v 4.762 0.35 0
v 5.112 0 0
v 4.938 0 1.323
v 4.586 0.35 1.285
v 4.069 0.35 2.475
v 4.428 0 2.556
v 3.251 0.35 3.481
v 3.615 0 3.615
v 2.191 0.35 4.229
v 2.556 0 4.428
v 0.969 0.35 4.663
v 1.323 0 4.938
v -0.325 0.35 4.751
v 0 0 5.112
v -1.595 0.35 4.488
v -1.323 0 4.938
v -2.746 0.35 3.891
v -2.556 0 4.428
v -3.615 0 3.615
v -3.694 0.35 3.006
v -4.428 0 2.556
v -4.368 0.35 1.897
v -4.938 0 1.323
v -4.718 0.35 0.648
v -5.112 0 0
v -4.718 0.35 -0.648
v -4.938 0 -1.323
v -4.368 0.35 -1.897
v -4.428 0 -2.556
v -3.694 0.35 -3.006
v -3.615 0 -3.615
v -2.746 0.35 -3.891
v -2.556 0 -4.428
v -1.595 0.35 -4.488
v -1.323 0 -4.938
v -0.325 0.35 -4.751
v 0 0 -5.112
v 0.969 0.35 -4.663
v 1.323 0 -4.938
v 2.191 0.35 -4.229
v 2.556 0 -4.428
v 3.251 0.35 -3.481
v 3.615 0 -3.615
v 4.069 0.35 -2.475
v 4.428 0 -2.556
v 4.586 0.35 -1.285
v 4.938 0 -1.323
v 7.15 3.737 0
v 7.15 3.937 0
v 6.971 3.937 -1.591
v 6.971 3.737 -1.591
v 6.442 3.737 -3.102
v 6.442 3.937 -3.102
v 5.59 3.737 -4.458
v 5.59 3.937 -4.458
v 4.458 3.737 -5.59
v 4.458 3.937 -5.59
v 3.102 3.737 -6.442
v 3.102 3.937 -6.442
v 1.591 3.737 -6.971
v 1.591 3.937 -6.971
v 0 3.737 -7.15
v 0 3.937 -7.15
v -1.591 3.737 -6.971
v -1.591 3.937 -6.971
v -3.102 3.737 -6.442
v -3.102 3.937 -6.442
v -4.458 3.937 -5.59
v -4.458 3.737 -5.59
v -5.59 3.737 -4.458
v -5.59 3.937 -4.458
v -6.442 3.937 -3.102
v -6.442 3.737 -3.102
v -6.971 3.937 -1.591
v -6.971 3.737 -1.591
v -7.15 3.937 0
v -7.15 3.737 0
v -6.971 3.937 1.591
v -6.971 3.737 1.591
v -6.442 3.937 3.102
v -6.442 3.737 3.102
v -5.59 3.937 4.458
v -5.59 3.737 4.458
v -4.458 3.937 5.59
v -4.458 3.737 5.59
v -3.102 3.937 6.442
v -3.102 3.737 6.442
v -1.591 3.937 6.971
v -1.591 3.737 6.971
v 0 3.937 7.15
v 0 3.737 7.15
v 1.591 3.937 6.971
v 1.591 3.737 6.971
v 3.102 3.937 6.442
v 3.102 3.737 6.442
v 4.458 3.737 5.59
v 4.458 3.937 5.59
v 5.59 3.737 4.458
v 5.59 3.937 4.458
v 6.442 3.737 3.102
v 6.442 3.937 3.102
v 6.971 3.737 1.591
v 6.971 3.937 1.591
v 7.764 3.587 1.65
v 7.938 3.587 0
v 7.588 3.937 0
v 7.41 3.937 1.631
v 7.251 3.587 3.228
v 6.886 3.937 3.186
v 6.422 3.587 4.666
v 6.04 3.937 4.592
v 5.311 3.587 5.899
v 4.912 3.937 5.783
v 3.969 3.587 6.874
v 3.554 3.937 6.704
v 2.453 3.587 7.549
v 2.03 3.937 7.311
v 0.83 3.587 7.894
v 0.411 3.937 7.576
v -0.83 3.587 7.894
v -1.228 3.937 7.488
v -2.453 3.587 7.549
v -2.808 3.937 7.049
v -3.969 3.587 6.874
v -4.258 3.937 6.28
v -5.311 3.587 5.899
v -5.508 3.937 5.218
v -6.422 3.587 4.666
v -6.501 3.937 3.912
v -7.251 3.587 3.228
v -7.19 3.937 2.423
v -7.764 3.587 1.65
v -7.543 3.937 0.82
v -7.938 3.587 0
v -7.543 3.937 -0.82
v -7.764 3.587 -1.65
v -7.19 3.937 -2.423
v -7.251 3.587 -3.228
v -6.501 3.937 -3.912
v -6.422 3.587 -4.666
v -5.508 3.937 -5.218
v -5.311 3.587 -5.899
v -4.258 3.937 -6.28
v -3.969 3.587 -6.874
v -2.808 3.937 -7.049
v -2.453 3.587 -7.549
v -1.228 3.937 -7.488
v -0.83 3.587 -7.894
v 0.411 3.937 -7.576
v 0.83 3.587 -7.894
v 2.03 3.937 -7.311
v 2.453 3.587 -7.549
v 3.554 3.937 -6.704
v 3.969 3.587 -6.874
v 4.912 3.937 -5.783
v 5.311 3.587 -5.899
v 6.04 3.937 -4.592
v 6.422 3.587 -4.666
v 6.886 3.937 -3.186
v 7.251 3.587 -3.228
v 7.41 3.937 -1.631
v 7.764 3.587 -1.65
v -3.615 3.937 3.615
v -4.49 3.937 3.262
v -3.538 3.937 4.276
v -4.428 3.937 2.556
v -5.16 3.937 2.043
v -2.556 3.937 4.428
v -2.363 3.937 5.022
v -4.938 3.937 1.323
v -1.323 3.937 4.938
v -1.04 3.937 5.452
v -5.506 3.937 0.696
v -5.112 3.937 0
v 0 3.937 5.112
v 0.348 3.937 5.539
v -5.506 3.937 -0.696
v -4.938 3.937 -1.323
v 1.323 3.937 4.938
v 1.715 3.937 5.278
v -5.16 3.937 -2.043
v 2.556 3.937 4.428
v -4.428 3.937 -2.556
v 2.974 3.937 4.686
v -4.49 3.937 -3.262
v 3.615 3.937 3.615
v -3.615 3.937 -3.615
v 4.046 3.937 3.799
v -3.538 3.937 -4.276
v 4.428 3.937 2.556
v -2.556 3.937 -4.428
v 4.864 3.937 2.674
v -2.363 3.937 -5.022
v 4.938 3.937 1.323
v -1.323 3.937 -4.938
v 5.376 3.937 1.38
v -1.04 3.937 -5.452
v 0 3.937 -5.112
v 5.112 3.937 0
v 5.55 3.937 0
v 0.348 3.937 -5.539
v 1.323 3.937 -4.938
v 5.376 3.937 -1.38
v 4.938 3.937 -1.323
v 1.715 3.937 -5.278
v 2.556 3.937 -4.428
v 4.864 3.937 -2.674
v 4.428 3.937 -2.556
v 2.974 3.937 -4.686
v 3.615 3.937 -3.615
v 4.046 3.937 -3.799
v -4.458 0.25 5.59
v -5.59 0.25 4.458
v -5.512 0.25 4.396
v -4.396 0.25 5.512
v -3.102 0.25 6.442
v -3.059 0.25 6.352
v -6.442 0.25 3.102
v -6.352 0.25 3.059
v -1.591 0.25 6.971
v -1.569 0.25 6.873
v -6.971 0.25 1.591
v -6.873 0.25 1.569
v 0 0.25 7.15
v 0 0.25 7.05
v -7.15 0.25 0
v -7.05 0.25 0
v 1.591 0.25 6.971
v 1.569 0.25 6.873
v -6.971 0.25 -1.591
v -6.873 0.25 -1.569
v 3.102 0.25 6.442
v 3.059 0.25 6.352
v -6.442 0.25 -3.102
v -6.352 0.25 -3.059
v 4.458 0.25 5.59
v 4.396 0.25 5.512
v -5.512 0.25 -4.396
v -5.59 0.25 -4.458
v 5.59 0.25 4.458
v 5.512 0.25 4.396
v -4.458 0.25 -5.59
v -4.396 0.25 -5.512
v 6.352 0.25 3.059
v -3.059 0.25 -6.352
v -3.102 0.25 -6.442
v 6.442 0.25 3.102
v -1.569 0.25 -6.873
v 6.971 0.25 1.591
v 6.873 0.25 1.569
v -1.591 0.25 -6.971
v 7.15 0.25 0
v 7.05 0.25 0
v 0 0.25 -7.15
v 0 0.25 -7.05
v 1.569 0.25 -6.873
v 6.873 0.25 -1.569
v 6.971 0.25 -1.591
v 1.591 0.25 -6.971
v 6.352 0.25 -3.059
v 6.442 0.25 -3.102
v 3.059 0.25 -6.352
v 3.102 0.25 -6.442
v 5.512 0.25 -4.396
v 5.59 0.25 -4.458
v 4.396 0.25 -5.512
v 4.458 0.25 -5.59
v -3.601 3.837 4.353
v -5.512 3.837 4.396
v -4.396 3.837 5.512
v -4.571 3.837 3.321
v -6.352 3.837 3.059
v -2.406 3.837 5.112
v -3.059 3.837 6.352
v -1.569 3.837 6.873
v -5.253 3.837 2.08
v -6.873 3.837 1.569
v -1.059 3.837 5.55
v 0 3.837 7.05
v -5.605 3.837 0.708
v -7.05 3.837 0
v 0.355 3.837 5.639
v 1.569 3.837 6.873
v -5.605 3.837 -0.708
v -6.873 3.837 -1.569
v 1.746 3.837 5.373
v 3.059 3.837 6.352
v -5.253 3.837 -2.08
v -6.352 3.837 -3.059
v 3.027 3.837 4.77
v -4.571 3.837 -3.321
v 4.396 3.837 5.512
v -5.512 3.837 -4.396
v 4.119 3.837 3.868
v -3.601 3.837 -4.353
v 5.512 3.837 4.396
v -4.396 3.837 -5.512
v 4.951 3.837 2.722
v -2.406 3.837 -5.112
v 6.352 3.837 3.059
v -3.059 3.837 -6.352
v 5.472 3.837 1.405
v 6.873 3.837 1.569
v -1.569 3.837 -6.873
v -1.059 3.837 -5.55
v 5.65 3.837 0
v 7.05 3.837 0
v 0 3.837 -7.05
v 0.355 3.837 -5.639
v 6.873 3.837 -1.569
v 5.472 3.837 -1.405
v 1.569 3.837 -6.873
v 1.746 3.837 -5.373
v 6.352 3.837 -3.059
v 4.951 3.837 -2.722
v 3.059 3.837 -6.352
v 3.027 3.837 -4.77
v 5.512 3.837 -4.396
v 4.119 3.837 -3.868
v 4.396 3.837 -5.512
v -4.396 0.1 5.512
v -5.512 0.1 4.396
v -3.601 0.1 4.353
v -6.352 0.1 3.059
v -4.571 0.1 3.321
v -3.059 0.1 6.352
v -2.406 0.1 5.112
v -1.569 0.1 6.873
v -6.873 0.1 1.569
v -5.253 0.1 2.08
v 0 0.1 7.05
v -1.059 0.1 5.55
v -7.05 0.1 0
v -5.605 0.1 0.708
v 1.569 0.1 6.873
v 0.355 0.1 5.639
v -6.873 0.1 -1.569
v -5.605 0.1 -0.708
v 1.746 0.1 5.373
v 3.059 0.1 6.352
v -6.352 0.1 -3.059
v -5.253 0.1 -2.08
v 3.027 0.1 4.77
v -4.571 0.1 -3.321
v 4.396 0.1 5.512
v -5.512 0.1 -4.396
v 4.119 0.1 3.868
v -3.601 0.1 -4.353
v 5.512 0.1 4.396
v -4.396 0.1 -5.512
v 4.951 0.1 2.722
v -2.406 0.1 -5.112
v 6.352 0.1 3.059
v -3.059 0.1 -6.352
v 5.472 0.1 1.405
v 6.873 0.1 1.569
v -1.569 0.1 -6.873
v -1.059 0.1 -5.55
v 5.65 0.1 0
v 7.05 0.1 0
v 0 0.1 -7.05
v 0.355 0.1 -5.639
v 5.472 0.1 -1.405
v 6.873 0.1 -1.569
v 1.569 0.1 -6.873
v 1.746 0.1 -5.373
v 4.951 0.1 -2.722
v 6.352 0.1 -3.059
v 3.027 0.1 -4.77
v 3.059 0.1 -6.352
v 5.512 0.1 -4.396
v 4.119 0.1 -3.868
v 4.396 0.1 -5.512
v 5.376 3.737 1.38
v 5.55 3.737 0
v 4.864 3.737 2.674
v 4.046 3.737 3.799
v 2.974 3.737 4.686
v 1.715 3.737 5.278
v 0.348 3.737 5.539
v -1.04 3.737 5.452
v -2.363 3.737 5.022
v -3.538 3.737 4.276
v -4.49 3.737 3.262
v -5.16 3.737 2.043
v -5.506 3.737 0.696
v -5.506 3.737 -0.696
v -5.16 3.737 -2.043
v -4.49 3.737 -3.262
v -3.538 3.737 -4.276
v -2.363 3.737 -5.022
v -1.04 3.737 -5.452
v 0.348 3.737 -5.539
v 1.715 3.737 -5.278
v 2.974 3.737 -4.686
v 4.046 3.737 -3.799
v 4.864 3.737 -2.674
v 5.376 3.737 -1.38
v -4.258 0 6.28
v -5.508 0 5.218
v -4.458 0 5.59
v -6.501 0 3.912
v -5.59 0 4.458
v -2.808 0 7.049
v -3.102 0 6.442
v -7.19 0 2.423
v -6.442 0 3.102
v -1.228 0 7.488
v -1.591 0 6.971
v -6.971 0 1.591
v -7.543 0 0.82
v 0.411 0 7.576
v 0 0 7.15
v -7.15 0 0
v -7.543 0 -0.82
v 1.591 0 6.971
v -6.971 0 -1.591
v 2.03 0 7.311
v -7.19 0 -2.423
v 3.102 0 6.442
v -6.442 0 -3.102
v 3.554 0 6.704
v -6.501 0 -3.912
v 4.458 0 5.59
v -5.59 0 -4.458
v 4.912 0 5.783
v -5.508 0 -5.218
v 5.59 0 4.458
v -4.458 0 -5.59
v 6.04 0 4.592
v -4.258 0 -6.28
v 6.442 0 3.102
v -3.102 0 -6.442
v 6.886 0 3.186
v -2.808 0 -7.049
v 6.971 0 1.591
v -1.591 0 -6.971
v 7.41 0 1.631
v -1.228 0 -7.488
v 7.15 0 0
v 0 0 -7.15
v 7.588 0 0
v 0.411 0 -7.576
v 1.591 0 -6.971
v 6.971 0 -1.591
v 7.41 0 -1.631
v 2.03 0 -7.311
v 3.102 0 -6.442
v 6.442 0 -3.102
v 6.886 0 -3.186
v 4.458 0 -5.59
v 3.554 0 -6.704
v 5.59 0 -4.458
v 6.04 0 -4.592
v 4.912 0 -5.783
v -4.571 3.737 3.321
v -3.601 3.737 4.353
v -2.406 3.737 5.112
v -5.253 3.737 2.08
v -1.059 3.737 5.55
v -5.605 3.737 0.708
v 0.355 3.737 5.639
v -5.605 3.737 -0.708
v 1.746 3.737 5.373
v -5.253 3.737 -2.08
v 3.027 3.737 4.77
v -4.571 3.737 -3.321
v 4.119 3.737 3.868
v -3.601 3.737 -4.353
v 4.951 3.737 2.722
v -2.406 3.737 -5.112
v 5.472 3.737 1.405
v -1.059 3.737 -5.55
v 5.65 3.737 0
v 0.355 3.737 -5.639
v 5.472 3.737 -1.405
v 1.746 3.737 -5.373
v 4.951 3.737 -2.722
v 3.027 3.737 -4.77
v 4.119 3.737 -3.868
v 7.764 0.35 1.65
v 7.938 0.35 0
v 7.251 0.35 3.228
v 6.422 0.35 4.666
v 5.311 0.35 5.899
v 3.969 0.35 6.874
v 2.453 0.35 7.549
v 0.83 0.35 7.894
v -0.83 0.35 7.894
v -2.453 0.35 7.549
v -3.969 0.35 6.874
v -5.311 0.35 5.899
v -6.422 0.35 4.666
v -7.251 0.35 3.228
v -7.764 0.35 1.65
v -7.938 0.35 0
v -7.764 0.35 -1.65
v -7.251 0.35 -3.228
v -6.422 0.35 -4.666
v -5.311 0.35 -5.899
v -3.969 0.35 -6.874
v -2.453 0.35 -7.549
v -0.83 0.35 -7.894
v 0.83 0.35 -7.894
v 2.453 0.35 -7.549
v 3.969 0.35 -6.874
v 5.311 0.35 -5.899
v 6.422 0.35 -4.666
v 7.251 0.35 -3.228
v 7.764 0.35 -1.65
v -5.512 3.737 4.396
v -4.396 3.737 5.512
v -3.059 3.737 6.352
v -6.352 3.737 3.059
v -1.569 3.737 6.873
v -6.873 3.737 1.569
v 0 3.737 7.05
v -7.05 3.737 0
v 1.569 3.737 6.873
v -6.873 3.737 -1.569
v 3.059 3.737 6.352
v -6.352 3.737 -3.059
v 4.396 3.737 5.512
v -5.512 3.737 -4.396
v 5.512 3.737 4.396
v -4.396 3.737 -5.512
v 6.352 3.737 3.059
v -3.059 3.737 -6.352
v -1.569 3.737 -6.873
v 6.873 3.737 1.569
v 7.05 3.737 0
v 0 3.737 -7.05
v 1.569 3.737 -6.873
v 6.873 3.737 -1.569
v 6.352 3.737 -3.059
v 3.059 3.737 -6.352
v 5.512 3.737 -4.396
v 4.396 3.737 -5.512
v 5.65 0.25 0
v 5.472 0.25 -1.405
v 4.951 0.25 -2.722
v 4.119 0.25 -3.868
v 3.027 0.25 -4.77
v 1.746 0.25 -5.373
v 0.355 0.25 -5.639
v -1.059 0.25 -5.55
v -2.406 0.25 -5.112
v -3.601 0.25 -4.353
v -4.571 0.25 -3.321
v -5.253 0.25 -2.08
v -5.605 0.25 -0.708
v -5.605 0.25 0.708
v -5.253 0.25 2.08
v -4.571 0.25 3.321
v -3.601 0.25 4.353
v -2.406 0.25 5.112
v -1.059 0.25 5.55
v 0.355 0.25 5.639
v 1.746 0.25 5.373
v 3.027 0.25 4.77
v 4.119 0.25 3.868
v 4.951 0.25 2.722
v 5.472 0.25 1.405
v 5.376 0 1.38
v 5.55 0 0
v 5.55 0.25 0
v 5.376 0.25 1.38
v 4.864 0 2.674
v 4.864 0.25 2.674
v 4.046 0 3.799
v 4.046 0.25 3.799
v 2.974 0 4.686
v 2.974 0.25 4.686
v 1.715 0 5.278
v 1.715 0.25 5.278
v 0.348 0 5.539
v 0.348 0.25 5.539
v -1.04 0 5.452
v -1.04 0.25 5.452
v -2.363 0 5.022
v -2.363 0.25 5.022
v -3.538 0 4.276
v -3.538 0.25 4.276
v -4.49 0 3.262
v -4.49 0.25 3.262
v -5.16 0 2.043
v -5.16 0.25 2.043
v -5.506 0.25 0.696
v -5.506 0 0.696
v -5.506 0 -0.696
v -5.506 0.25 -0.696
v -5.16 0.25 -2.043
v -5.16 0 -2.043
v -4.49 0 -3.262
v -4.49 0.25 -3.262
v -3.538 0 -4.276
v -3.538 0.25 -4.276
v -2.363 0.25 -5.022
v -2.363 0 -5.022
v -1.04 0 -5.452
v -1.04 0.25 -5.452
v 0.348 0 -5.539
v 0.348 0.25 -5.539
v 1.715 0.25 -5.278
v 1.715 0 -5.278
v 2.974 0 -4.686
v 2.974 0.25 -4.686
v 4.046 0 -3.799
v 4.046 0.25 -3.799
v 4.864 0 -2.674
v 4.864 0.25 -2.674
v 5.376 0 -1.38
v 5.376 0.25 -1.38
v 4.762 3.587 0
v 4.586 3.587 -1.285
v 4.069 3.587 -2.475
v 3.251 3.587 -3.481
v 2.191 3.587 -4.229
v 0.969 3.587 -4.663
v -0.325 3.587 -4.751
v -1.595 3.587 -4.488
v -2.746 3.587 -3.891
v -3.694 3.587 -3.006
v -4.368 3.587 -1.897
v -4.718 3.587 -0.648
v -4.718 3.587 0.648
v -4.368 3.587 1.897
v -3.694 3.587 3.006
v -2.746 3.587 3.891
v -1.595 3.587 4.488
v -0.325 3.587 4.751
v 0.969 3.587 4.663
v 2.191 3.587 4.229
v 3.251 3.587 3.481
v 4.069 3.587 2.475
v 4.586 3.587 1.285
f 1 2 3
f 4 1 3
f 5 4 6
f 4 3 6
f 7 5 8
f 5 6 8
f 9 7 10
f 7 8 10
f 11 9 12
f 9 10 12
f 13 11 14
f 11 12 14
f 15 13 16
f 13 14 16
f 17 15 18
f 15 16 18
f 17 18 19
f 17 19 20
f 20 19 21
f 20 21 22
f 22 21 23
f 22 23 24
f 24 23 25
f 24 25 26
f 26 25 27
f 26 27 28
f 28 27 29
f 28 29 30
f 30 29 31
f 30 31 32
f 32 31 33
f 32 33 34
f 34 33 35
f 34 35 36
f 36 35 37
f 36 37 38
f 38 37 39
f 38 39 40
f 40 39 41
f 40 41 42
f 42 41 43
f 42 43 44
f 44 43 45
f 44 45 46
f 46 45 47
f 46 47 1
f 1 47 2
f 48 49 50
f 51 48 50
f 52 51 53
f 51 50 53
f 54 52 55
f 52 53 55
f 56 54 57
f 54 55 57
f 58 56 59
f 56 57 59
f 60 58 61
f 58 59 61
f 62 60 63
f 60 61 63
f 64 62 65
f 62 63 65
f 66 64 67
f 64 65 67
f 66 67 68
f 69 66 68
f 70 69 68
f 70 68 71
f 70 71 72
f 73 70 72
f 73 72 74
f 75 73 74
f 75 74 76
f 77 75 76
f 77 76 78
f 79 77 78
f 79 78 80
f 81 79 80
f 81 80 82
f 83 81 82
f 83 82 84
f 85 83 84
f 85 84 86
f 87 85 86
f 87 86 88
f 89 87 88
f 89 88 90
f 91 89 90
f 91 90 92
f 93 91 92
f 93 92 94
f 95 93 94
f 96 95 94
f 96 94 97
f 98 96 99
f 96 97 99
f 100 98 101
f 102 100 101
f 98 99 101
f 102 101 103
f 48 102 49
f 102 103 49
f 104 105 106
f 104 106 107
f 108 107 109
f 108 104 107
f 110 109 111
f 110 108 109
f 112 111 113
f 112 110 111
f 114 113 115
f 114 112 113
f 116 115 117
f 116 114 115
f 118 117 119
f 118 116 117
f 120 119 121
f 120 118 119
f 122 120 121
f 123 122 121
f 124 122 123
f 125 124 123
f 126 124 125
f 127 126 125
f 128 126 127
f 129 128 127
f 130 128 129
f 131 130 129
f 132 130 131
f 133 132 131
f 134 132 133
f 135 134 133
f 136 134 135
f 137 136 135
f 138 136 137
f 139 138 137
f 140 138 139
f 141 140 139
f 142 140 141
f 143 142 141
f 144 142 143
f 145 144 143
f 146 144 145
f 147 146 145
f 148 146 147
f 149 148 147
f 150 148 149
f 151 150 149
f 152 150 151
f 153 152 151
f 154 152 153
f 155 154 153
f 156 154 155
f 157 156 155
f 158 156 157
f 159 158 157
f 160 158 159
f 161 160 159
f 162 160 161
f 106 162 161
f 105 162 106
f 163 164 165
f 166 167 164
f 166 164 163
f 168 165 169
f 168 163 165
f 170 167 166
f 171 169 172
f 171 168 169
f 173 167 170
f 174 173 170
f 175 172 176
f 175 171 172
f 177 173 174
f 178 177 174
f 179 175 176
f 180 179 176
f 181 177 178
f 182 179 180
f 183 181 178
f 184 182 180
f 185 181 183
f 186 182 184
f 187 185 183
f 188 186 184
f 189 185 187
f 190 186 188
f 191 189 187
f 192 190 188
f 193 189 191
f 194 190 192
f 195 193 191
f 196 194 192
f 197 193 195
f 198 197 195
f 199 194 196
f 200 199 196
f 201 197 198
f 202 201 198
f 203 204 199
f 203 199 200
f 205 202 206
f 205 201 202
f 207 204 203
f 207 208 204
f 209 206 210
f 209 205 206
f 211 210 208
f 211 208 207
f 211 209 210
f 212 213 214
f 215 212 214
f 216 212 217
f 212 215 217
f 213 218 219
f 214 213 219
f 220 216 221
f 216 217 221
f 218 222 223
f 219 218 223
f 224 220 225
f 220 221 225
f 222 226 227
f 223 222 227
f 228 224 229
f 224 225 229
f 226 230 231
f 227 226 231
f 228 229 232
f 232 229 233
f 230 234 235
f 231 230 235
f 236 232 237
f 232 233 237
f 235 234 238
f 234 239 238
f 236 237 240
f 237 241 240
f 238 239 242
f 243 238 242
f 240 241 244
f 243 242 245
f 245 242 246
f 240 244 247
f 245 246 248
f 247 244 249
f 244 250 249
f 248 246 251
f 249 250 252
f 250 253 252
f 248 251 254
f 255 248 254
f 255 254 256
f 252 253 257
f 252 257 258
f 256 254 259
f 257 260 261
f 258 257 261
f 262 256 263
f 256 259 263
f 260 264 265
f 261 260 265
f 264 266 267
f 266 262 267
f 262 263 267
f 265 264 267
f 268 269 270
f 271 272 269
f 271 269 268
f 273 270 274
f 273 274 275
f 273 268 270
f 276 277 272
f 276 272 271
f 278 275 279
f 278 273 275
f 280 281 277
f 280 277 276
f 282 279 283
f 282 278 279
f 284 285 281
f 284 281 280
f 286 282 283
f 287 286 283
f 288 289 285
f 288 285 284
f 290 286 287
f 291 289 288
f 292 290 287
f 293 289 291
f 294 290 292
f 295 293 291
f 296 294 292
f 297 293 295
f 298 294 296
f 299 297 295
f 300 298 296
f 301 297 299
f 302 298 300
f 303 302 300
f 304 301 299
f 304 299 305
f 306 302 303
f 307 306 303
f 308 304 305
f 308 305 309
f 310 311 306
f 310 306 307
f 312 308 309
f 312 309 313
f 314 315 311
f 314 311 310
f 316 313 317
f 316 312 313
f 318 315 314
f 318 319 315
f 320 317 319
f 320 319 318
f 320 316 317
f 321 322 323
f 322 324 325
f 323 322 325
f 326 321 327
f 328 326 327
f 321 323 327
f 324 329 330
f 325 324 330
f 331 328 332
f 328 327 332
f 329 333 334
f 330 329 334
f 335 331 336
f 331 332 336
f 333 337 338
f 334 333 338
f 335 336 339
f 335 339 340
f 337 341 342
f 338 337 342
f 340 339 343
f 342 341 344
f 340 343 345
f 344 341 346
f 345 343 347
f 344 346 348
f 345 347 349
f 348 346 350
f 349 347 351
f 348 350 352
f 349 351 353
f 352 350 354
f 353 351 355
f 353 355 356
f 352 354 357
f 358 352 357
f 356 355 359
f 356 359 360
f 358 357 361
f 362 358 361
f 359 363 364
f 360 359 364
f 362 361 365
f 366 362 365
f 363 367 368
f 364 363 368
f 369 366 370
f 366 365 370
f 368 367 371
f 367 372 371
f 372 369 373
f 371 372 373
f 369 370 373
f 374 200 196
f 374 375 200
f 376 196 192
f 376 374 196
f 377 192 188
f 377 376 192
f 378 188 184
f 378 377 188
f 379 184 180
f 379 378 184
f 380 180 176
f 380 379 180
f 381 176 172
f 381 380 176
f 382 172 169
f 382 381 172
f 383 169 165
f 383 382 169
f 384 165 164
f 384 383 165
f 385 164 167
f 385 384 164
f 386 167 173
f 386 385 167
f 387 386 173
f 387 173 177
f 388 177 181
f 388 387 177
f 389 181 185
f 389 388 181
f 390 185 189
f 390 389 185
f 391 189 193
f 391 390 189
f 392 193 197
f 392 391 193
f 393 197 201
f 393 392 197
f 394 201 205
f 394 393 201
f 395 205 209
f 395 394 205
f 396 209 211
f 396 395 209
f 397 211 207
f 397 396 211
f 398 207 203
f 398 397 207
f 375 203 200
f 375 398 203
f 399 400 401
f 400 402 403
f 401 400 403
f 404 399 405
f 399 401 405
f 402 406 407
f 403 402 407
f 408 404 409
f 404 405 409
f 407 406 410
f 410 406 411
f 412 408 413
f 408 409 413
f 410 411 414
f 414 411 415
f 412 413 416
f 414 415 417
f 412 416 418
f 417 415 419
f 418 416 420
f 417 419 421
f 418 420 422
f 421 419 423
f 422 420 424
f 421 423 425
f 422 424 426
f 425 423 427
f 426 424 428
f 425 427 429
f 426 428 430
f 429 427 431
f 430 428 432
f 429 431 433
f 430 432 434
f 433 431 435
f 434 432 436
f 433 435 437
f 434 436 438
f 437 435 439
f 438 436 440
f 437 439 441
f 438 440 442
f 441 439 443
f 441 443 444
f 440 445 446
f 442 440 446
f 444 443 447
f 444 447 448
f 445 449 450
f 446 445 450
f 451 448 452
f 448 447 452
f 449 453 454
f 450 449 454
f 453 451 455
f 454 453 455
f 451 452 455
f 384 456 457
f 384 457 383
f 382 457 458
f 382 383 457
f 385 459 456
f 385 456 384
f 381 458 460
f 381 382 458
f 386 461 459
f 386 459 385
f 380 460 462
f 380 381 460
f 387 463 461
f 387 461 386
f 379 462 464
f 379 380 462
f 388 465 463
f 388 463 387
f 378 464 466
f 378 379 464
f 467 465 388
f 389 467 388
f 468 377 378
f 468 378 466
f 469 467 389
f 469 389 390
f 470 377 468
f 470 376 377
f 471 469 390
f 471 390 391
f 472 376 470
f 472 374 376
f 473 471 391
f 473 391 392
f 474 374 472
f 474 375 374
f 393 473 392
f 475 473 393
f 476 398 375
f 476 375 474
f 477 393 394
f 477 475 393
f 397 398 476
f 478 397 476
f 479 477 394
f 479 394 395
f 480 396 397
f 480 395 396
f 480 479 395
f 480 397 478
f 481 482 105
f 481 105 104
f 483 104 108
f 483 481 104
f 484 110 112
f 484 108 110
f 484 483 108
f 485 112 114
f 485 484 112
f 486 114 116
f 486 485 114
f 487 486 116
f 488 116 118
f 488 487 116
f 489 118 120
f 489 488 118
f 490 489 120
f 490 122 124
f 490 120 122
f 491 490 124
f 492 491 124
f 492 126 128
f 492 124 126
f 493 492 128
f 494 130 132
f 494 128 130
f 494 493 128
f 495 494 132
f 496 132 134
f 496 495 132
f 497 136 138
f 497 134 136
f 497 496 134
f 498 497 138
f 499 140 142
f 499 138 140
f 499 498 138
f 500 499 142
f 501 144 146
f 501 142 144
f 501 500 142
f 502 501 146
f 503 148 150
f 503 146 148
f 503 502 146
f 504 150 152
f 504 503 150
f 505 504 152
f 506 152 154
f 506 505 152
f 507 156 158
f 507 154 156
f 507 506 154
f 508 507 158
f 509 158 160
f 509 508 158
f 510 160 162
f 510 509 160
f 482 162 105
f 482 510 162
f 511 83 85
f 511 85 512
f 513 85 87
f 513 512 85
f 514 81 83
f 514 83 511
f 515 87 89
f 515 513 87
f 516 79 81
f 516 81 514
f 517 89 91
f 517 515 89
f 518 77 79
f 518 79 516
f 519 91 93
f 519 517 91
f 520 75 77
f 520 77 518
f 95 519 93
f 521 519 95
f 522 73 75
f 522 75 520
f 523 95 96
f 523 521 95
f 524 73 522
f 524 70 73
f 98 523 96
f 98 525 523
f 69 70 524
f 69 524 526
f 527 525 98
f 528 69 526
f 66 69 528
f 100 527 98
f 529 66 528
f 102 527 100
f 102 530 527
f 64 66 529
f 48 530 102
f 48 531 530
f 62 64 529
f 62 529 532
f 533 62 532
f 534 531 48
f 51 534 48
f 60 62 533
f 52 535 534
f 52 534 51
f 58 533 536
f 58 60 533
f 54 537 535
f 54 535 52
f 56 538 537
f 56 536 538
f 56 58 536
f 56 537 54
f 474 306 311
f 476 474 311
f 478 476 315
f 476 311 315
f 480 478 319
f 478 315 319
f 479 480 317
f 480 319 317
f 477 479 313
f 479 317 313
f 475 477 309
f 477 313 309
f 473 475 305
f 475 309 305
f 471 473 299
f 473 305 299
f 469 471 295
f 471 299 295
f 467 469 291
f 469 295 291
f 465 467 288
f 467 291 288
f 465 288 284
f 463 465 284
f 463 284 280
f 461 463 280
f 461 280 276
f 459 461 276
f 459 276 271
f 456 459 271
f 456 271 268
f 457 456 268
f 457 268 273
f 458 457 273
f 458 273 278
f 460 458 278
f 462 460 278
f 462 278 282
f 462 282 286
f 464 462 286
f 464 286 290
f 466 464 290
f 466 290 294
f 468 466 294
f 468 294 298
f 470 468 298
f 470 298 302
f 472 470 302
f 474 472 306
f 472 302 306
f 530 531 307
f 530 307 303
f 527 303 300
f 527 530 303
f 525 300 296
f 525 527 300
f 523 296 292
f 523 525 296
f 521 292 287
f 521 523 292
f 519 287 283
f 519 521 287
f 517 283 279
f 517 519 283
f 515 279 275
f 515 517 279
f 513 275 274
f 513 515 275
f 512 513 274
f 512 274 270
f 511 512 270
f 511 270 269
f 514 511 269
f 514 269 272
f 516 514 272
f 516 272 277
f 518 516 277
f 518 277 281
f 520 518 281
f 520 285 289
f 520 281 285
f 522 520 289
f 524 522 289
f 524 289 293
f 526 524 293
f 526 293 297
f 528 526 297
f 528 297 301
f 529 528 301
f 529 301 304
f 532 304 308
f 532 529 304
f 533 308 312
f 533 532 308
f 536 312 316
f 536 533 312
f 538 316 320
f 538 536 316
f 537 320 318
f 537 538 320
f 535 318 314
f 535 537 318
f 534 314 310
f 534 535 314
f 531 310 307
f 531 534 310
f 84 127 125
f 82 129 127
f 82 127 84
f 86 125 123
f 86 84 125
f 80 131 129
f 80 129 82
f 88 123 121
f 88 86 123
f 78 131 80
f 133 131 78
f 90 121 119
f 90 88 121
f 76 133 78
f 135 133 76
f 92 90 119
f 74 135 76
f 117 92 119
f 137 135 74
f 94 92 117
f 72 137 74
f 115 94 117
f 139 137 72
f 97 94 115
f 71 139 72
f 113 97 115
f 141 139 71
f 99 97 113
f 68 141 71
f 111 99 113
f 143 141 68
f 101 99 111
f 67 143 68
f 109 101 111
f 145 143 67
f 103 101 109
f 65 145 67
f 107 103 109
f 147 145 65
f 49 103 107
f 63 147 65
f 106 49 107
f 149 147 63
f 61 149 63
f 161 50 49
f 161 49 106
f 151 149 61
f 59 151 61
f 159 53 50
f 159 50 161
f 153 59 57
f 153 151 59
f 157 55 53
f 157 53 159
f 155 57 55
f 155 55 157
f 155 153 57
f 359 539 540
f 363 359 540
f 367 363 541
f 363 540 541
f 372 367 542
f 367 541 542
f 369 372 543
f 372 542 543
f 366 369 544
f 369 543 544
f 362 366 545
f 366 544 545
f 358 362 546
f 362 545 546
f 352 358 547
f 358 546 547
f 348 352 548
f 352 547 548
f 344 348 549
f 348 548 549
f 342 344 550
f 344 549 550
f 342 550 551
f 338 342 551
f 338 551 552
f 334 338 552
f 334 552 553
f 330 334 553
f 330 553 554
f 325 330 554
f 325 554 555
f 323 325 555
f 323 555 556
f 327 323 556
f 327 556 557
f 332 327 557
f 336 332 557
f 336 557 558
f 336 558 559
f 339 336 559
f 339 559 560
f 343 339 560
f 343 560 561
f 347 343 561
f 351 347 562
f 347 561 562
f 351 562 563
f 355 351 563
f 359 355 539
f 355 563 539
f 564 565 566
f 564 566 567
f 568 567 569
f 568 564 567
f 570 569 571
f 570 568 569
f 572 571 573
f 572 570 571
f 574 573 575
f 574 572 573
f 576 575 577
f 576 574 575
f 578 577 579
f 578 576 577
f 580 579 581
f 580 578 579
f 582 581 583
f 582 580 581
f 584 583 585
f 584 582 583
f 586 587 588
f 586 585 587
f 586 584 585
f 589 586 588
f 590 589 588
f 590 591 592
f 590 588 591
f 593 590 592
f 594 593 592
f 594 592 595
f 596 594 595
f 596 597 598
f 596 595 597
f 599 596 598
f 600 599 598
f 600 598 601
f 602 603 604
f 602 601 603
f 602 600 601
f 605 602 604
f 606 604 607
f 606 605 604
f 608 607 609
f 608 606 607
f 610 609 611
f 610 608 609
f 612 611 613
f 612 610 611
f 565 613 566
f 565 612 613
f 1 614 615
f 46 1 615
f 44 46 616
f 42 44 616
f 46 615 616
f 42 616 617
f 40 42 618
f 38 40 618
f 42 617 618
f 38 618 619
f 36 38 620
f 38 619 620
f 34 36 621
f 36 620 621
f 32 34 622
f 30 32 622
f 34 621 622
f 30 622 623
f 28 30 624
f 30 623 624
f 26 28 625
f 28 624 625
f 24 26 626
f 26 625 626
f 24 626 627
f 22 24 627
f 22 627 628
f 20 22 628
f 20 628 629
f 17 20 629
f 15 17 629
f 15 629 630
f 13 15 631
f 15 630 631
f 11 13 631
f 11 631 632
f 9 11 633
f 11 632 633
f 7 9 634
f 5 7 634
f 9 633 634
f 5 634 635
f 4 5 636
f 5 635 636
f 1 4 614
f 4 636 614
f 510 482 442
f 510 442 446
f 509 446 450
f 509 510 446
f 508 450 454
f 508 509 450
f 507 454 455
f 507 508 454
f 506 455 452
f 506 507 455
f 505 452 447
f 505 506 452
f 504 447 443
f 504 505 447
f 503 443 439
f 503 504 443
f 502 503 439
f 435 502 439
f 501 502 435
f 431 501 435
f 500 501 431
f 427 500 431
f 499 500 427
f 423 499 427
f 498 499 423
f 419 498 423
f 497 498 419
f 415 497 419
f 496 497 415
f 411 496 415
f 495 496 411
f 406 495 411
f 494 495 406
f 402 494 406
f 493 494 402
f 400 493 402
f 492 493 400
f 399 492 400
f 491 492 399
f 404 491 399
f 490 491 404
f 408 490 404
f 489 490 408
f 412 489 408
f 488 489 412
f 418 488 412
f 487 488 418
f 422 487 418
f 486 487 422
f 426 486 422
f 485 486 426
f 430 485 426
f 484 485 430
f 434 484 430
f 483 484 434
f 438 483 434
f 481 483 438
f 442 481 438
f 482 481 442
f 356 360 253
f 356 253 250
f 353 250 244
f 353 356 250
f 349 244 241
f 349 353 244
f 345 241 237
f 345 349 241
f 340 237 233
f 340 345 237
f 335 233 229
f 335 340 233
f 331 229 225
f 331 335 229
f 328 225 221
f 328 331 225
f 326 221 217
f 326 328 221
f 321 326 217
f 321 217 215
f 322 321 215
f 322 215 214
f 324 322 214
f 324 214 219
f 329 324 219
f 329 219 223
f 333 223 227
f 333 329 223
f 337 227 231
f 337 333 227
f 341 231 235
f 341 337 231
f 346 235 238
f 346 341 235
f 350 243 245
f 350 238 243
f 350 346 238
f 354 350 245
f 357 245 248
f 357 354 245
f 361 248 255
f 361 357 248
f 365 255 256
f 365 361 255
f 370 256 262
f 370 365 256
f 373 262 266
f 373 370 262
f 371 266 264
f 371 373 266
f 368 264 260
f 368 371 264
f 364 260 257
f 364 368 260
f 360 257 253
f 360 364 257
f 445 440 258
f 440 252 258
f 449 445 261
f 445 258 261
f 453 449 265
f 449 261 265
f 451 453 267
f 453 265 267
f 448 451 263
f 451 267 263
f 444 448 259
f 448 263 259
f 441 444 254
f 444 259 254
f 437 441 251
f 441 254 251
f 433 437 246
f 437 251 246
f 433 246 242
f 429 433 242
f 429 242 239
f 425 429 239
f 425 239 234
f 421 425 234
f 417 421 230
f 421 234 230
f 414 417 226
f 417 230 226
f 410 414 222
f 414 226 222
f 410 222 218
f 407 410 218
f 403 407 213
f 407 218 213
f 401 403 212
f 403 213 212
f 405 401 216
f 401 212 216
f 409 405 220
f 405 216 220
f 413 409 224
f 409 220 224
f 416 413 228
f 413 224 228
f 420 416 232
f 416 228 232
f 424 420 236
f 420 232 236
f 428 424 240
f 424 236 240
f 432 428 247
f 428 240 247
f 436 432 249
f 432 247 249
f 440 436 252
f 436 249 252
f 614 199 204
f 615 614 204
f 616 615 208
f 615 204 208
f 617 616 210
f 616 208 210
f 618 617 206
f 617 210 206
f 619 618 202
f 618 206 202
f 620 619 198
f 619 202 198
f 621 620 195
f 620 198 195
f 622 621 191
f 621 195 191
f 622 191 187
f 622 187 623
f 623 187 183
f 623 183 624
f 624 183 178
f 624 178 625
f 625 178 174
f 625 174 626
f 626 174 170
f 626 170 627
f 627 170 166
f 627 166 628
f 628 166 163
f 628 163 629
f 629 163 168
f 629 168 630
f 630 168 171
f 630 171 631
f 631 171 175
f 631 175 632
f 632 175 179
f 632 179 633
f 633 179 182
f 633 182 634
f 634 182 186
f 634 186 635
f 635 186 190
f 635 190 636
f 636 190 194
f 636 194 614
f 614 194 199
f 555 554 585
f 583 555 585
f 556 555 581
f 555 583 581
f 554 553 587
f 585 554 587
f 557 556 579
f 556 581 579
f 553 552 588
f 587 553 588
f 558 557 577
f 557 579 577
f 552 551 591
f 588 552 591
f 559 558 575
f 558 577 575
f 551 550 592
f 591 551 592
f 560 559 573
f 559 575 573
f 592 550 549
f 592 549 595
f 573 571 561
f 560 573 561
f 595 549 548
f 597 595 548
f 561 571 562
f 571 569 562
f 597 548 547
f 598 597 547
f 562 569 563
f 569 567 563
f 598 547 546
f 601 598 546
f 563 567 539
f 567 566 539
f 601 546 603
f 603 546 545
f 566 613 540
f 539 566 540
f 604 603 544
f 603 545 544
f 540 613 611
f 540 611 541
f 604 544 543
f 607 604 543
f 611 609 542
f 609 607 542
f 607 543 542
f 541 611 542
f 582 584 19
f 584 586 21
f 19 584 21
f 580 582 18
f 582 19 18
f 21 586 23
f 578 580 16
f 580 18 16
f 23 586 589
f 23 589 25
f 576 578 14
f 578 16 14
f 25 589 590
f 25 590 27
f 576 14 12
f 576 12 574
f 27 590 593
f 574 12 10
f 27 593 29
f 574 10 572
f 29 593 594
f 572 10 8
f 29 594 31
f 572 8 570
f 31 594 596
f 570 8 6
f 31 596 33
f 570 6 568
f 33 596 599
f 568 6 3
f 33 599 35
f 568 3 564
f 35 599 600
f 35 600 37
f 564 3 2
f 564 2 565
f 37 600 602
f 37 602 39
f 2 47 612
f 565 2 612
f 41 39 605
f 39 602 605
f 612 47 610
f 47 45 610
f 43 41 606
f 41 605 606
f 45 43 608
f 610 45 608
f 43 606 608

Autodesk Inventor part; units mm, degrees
ref_plane "YZ Plane" through (0, 0, 0) normal (1, 0, 0) x (0, 1, 0)
ref_plane "XZ Plane" through (0, 0, 0) normal (0, 1, 0) x (-1, 0, 0)
ref_plane "XY Plane" through (0, 0, 0) normal (0, 0, 1) x (1, 0, 0)
sketch "Sketch1" plane through (0, 0, 0) normal (0, 0, 1) x (1, 0, 0)
  line L0 (0, 0) -> (0, 3.1469)
  line L1 (4.7625, 0) -> (4.7625, 3.937)
  line L2 (4.7625, 3.937) -> (5.55, 3.937)
  line L3 (5.55, 3.937) -> (5.55, 3.737)
  line L4 (5.55, 3.737) -> (5.65, 3.737)
  line L5 (5.65, 3.737) -> (5.65, 3.837)
  line L6 (5.65, 3.837) -> (7.05, 3.837)
  line L7 (7.05, 3.837) -> (7.05, 3.737)
  line L8 (7.05, 3.737) -> (7.15, 3.737)
  line L9 (7.15, 3.737) -> (7.15, 3.937)
  line L10 (7.15, 3.937) -> (7.9375, 3.937)
  line L11 (7.9375, 3.937) -> (7.9375, 0)
  line L12 (7.9375, 0) -> (7.15, 0)
  line L13 (7.15, 0) -> (7.15, 0.25)
  line L14 (7.15, 0.25) -> (7.05, 0.25)
  line L15 (7.05, 0.25) -> (7.05, 0.1)
  line L16 (7.05, 0.1) -> (5.65, 0.1)
  line L17 (5.65, 0.1) -> (5.65, 0.25)
  line L18 (5.65, 0.25) -> (5.55, 0.25)
  line L19 (5.55, 0.25) -> (5.55, 0)
  line L20 (5.55, 0) -> (4.7625, 0)
  line L21 (4.7625, 1.9685) -> (7.9375, 1.9685) construction
  point P0 (6.35, 0.1)
  point P1 (6.35, 1.9685)
  dimension "d0" = 9.525
  dimension "d1" = 3.937
  dimension "d2" = 15.875
  dimension "d3" = 0.1
  dimension "d4" = 0.25
  dimension "d5" = 0.1
  dimension "d6" = 0.1
  dimension "d7" = 1.4
  dimension "d8" = 0.2
revolve "Revolution1" add sketch "Sketch1" angle 360 about axis through (0, 0, 0) along (0, 1, 0)
chamfer "Chamfer1" distance 0.35 angle 45 4 edges at (-4.7625, 3.937, 0) (-7.9375, 3.937, 0) (-7.9375, 0, 0) (-4.7625, 0, 0)
properties part number "R1038_ZZ_W Bearing" material "Stainless Steel"
